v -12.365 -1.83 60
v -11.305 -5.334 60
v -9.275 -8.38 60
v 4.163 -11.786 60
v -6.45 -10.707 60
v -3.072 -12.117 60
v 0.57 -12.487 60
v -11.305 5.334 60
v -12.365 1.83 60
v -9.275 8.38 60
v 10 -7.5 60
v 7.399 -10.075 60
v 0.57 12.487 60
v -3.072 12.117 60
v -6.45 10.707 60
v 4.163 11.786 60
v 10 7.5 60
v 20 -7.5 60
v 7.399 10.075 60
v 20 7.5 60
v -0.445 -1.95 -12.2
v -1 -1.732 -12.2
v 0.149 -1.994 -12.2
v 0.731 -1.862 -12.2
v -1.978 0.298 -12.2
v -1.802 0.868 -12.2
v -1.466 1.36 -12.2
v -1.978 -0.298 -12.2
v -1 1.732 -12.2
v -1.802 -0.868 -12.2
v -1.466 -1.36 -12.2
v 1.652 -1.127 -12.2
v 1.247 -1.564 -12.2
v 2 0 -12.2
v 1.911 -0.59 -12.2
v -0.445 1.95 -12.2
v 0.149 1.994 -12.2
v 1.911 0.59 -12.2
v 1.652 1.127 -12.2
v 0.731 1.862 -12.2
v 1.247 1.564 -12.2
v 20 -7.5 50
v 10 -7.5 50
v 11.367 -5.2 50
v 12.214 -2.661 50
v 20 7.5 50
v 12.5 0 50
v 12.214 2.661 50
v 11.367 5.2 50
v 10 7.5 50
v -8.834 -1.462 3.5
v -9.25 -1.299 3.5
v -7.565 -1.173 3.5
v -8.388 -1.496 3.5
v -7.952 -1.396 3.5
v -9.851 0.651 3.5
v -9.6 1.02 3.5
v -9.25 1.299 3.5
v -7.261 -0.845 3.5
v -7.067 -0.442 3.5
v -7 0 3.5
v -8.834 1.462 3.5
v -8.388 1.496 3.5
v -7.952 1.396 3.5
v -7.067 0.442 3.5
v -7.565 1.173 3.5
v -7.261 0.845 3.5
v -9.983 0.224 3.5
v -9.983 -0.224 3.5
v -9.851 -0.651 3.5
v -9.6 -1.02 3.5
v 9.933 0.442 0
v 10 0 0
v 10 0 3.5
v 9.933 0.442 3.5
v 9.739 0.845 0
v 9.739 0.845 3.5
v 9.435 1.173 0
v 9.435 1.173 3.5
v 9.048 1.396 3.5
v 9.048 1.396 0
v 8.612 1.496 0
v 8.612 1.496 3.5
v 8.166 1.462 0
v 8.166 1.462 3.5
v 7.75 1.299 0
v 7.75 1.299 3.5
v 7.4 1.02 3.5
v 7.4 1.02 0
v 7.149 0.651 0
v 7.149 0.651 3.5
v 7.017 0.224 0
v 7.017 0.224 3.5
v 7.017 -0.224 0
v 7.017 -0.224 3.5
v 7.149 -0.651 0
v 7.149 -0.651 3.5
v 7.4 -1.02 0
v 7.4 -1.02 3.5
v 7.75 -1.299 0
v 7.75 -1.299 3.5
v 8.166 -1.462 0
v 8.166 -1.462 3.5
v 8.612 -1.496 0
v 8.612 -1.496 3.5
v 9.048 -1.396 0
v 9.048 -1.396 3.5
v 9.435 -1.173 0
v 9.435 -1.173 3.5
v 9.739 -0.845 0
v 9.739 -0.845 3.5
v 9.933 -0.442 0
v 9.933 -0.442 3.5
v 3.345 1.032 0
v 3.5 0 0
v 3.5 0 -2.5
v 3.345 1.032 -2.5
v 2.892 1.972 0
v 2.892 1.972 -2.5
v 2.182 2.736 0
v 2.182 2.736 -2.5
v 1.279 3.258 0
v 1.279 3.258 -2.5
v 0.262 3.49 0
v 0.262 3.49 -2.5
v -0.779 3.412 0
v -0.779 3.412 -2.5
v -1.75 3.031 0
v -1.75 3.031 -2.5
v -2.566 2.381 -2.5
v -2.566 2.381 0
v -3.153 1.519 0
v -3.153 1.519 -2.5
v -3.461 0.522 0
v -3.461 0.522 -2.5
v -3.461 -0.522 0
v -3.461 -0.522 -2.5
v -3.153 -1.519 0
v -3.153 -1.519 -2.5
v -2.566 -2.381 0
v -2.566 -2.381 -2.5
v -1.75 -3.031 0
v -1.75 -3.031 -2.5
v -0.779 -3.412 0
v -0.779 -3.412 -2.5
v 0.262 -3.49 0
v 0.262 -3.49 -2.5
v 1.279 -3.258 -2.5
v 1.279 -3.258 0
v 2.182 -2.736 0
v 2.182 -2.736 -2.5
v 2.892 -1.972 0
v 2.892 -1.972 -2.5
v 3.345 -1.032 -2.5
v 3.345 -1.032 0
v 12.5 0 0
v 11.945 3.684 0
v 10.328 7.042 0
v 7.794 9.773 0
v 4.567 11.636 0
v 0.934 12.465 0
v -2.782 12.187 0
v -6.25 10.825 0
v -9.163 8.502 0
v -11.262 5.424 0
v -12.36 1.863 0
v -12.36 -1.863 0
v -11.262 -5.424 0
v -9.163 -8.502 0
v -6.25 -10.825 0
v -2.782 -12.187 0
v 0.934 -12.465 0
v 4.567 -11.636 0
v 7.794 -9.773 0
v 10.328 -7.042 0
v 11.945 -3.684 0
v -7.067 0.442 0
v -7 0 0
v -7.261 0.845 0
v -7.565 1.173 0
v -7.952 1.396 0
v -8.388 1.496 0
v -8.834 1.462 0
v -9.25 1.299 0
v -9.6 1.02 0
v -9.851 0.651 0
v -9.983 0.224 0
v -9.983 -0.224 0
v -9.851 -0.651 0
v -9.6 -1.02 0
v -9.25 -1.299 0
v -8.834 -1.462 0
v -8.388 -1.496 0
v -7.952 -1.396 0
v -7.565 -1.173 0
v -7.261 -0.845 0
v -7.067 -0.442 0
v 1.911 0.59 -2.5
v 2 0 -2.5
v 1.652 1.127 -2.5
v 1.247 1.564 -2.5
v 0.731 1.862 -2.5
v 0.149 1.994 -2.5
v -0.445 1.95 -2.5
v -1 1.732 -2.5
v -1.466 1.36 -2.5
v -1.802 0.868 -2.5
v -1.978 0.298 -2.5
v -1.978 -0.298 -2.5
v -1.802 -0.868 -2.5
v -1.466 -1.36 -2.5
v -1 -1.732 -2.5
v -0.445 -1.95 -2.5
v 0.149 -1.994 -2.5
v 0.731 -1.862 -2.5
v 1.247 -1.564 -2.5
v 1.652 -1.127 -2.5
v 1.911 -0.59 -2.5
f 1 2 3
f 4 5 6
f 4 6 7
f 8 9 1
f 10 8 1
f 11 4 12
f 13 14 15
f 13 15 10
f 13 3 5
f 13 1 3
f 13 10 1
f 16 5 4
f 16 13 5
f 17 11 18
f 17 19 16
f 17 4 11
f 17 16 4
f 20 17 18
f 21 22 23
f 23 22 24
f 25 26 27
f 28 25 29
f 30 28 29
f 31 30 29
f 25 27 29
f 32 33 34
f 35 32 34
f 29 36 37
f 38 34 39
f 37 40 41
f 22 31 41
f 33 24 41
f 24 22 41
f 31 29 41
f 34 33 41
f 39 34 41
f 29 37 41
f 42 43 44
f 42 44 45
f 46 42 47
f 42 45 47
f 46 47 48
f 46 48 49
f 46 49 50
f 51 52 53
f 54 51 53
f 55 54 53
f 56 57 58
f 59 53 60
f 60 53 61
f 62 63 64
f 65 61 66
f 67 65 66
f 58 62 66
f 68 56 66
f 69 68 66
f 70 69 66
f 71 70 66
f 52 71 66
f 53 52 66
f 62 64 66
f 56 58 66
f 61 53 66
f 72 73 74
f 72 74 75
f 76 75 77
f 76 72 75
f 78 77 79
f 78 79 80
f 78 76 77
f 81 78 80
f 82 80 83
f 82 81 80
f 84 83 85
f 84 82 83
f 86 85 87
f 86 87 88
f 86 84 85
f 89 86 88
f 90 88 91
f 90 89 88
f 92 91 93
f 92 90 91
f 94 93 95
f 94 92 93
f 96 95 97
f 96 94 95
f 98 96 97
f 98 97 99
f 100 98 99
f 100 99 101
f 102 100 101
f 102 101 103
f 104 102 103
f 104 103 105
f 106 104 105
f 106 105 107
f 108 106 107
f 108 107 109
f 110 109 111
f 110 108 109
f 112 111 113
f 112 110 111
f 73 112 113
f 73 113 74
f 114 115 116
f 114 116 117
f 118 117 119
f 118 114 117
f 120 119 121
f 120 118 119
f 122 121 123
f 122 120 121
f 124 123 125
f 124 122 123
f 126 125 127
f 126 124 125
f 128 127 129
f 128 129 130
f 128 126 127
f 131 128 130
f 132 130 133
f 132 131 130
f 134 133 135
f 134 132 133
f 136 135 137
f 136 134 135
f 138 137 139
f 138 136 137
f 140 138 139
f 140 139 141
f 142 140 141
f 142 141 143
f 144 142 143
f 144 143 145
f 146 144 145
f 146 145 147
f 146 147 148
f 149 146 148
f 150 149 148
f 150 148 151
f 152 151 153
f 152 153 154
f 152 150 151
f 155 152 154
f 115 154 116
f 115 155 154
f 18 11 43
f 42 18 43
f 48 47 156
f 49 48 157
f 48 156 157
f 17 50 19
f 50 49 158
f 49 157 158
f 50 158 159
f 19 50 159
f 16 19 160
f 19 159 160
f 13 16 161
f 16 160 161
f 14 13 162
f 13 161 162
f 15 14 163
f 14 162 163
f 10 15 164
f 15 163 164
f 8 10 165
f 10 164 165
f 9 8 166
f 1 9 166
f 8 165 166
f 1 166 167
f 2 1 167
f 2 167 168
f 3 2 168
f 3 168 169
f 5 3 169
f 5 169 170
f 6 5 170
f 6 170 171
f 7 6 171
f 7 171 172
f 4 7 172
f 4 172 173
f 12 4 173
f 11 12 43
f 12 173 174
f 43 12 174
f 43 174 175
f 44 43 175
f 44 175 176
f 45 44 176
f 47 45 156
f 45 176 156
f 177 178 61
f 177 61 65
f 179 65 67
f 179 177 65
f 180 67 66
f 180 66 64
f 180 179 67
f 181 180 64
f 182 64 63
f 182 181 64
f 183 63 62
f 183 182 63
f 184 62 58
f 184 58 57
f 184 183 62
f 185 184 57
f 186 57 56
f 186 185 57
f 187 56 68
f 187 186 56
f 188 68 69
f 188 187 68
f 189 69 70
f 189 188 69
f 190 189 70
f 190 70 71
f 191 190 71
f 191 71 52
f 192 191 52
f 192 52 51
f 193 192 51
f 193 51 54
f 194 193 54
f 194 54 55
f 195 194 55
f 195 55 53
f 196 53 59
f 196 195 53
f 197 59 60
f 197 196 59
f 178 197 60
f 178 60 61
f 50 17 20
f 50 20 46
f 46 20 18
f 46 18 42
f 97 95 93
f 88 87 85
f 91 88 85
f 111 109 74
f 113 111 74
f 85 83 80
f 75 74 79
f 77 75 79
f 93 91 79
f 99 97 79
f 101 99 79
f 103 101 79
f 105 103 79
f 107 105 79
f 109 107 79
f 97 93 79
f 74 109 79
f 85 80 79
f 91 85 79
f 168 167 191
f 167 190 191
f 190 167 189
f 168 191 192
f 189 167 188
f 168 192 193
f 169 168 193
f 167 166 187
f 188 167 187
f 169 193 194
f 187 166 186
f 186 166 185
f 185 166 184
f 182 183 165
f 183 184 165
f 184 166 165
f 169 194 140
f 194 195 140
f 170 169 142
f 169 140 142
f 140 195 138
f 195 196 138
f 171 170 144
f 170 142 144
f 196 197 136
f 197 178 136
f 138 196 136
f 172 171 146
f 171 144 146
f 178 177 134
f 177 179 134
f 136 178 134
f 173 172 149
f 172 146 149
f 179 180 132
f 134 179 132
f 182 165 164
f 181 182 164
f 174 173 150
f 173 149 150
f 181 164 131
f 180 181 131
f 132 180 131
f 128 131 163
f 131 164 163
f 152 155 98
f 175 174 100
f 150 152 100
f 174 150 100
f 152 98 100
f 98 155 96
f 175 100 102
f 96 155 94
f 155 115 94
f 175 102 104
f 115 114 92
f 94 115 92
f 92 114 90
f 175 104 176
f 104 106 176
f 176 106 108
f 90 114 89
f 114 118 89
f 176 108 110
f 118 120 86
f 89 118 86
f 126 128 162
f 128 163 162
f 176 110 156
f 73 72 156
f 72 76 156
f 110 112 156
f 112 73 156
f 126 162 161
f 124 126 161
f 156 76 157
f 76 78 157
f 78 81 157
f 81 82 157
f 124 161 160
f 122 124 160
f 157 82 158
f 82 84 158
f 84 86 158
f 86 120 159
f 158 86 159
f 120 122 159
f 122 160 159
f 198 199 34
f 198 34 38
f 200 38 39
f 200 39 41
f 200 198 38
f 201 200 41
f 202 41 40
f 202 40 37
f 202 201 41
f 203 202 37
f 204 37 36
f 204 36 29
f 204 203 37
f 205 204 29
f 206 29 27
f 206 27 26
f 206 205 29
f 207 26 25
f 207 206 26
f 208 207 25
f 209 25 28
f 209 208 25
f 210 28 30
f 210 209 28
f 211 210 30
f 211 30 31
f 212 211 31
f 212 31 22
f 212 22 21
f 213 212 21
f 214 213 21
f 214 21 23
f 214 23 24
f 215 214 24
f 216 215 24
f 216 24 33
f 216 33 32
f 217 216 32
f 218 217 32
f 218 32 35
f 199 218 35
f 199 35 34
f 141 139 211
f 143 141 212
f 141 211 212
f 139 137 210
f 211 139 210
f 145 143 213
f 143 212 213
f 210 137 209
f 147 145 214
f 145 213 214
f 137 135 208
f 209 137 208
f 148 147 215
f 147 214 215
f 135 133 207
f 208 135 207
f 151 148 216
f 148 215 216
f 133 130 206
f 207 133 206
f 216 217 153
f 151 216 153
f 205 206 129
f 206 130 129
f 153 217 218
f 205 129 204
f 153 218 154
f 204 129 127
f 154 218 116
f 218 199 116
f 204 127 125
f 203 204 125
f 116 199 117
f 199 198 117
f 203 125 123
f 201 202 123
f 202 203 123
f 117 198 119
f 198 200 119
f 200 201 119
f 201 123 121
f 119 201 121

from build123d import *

# Parameters (mm, degrees)
SKETCH1_R           = 12.5
BOSS_EXTRUDE1_DEPTH = 60
SKETCH2_R           = 1.5
CUT_EXTRUDE1_DEPTH  = 3.5
SKETCH2_3_R         = 3.5
SKETCH2_3_R_2       = 2
BOSS_EXTRUDE2_DEPTH = 2.5
SKETCH2_4_R         = 2
BOSS_EXTRUDE3_DEPTH = 12.2
SKETCH3_W           = 10
SKETCH3_H           = 15
BOSS_EXTRUDE4_DEPTH = 20


with BuildPart() as part:
    # Sketch1 → Boss-Extrude1 (new body)
    with BuildSketch(Plane.XY):
        Circle(SKETCH1_R)
    extrude(amount=BOSS_EXTRUDE1_DEPTH)

    # Sketch2 → Cut-Extrude1 (cut)
    with BuildSketch(Plane.XY):
        with Locations((8.5, 0)):
            Circle(SKETCH2_R)
        with Locations((-8.5, 0)):
            Circle(SKETCH2_R)
    extrude(amount=CUT_EXTRUDE1_DEPTH, mode=Mode.SUBTRACT)

    # Sketch2<3> → Boss-Extrude2 (add)
    with BuildSketch(Plane.XY):
        Circle(SKETCH2_3_R)
        Circle(SKETCH2_3_R_2, mode=Mode.SUBTRACT)
    extrude(amount=-BOSS_EXTRUDE2_DEPTH)

    # Sketch2<4> → Boss-Extrude3 (add)
    with BuildSketch(Plane.XY):
        Circle(SKETCH2_4_R)
    extrude(amount=-BOSS_EXTRUDE3_DEPTH)

    # Sketch3 → Boss-Extrude4 (add)
    with BuildSketch(Plane(origin=(0, 0, 0), x_dir=(0, 0, -1), z_dir=(1, 0, 0))):
        with Locations((-55, 0)):
            Rectangle(SKETCH3_W, SKETCH3_H)
    extrude(amount=BOSS_EXTRUDE4_DEPTH)


solid = part.part
